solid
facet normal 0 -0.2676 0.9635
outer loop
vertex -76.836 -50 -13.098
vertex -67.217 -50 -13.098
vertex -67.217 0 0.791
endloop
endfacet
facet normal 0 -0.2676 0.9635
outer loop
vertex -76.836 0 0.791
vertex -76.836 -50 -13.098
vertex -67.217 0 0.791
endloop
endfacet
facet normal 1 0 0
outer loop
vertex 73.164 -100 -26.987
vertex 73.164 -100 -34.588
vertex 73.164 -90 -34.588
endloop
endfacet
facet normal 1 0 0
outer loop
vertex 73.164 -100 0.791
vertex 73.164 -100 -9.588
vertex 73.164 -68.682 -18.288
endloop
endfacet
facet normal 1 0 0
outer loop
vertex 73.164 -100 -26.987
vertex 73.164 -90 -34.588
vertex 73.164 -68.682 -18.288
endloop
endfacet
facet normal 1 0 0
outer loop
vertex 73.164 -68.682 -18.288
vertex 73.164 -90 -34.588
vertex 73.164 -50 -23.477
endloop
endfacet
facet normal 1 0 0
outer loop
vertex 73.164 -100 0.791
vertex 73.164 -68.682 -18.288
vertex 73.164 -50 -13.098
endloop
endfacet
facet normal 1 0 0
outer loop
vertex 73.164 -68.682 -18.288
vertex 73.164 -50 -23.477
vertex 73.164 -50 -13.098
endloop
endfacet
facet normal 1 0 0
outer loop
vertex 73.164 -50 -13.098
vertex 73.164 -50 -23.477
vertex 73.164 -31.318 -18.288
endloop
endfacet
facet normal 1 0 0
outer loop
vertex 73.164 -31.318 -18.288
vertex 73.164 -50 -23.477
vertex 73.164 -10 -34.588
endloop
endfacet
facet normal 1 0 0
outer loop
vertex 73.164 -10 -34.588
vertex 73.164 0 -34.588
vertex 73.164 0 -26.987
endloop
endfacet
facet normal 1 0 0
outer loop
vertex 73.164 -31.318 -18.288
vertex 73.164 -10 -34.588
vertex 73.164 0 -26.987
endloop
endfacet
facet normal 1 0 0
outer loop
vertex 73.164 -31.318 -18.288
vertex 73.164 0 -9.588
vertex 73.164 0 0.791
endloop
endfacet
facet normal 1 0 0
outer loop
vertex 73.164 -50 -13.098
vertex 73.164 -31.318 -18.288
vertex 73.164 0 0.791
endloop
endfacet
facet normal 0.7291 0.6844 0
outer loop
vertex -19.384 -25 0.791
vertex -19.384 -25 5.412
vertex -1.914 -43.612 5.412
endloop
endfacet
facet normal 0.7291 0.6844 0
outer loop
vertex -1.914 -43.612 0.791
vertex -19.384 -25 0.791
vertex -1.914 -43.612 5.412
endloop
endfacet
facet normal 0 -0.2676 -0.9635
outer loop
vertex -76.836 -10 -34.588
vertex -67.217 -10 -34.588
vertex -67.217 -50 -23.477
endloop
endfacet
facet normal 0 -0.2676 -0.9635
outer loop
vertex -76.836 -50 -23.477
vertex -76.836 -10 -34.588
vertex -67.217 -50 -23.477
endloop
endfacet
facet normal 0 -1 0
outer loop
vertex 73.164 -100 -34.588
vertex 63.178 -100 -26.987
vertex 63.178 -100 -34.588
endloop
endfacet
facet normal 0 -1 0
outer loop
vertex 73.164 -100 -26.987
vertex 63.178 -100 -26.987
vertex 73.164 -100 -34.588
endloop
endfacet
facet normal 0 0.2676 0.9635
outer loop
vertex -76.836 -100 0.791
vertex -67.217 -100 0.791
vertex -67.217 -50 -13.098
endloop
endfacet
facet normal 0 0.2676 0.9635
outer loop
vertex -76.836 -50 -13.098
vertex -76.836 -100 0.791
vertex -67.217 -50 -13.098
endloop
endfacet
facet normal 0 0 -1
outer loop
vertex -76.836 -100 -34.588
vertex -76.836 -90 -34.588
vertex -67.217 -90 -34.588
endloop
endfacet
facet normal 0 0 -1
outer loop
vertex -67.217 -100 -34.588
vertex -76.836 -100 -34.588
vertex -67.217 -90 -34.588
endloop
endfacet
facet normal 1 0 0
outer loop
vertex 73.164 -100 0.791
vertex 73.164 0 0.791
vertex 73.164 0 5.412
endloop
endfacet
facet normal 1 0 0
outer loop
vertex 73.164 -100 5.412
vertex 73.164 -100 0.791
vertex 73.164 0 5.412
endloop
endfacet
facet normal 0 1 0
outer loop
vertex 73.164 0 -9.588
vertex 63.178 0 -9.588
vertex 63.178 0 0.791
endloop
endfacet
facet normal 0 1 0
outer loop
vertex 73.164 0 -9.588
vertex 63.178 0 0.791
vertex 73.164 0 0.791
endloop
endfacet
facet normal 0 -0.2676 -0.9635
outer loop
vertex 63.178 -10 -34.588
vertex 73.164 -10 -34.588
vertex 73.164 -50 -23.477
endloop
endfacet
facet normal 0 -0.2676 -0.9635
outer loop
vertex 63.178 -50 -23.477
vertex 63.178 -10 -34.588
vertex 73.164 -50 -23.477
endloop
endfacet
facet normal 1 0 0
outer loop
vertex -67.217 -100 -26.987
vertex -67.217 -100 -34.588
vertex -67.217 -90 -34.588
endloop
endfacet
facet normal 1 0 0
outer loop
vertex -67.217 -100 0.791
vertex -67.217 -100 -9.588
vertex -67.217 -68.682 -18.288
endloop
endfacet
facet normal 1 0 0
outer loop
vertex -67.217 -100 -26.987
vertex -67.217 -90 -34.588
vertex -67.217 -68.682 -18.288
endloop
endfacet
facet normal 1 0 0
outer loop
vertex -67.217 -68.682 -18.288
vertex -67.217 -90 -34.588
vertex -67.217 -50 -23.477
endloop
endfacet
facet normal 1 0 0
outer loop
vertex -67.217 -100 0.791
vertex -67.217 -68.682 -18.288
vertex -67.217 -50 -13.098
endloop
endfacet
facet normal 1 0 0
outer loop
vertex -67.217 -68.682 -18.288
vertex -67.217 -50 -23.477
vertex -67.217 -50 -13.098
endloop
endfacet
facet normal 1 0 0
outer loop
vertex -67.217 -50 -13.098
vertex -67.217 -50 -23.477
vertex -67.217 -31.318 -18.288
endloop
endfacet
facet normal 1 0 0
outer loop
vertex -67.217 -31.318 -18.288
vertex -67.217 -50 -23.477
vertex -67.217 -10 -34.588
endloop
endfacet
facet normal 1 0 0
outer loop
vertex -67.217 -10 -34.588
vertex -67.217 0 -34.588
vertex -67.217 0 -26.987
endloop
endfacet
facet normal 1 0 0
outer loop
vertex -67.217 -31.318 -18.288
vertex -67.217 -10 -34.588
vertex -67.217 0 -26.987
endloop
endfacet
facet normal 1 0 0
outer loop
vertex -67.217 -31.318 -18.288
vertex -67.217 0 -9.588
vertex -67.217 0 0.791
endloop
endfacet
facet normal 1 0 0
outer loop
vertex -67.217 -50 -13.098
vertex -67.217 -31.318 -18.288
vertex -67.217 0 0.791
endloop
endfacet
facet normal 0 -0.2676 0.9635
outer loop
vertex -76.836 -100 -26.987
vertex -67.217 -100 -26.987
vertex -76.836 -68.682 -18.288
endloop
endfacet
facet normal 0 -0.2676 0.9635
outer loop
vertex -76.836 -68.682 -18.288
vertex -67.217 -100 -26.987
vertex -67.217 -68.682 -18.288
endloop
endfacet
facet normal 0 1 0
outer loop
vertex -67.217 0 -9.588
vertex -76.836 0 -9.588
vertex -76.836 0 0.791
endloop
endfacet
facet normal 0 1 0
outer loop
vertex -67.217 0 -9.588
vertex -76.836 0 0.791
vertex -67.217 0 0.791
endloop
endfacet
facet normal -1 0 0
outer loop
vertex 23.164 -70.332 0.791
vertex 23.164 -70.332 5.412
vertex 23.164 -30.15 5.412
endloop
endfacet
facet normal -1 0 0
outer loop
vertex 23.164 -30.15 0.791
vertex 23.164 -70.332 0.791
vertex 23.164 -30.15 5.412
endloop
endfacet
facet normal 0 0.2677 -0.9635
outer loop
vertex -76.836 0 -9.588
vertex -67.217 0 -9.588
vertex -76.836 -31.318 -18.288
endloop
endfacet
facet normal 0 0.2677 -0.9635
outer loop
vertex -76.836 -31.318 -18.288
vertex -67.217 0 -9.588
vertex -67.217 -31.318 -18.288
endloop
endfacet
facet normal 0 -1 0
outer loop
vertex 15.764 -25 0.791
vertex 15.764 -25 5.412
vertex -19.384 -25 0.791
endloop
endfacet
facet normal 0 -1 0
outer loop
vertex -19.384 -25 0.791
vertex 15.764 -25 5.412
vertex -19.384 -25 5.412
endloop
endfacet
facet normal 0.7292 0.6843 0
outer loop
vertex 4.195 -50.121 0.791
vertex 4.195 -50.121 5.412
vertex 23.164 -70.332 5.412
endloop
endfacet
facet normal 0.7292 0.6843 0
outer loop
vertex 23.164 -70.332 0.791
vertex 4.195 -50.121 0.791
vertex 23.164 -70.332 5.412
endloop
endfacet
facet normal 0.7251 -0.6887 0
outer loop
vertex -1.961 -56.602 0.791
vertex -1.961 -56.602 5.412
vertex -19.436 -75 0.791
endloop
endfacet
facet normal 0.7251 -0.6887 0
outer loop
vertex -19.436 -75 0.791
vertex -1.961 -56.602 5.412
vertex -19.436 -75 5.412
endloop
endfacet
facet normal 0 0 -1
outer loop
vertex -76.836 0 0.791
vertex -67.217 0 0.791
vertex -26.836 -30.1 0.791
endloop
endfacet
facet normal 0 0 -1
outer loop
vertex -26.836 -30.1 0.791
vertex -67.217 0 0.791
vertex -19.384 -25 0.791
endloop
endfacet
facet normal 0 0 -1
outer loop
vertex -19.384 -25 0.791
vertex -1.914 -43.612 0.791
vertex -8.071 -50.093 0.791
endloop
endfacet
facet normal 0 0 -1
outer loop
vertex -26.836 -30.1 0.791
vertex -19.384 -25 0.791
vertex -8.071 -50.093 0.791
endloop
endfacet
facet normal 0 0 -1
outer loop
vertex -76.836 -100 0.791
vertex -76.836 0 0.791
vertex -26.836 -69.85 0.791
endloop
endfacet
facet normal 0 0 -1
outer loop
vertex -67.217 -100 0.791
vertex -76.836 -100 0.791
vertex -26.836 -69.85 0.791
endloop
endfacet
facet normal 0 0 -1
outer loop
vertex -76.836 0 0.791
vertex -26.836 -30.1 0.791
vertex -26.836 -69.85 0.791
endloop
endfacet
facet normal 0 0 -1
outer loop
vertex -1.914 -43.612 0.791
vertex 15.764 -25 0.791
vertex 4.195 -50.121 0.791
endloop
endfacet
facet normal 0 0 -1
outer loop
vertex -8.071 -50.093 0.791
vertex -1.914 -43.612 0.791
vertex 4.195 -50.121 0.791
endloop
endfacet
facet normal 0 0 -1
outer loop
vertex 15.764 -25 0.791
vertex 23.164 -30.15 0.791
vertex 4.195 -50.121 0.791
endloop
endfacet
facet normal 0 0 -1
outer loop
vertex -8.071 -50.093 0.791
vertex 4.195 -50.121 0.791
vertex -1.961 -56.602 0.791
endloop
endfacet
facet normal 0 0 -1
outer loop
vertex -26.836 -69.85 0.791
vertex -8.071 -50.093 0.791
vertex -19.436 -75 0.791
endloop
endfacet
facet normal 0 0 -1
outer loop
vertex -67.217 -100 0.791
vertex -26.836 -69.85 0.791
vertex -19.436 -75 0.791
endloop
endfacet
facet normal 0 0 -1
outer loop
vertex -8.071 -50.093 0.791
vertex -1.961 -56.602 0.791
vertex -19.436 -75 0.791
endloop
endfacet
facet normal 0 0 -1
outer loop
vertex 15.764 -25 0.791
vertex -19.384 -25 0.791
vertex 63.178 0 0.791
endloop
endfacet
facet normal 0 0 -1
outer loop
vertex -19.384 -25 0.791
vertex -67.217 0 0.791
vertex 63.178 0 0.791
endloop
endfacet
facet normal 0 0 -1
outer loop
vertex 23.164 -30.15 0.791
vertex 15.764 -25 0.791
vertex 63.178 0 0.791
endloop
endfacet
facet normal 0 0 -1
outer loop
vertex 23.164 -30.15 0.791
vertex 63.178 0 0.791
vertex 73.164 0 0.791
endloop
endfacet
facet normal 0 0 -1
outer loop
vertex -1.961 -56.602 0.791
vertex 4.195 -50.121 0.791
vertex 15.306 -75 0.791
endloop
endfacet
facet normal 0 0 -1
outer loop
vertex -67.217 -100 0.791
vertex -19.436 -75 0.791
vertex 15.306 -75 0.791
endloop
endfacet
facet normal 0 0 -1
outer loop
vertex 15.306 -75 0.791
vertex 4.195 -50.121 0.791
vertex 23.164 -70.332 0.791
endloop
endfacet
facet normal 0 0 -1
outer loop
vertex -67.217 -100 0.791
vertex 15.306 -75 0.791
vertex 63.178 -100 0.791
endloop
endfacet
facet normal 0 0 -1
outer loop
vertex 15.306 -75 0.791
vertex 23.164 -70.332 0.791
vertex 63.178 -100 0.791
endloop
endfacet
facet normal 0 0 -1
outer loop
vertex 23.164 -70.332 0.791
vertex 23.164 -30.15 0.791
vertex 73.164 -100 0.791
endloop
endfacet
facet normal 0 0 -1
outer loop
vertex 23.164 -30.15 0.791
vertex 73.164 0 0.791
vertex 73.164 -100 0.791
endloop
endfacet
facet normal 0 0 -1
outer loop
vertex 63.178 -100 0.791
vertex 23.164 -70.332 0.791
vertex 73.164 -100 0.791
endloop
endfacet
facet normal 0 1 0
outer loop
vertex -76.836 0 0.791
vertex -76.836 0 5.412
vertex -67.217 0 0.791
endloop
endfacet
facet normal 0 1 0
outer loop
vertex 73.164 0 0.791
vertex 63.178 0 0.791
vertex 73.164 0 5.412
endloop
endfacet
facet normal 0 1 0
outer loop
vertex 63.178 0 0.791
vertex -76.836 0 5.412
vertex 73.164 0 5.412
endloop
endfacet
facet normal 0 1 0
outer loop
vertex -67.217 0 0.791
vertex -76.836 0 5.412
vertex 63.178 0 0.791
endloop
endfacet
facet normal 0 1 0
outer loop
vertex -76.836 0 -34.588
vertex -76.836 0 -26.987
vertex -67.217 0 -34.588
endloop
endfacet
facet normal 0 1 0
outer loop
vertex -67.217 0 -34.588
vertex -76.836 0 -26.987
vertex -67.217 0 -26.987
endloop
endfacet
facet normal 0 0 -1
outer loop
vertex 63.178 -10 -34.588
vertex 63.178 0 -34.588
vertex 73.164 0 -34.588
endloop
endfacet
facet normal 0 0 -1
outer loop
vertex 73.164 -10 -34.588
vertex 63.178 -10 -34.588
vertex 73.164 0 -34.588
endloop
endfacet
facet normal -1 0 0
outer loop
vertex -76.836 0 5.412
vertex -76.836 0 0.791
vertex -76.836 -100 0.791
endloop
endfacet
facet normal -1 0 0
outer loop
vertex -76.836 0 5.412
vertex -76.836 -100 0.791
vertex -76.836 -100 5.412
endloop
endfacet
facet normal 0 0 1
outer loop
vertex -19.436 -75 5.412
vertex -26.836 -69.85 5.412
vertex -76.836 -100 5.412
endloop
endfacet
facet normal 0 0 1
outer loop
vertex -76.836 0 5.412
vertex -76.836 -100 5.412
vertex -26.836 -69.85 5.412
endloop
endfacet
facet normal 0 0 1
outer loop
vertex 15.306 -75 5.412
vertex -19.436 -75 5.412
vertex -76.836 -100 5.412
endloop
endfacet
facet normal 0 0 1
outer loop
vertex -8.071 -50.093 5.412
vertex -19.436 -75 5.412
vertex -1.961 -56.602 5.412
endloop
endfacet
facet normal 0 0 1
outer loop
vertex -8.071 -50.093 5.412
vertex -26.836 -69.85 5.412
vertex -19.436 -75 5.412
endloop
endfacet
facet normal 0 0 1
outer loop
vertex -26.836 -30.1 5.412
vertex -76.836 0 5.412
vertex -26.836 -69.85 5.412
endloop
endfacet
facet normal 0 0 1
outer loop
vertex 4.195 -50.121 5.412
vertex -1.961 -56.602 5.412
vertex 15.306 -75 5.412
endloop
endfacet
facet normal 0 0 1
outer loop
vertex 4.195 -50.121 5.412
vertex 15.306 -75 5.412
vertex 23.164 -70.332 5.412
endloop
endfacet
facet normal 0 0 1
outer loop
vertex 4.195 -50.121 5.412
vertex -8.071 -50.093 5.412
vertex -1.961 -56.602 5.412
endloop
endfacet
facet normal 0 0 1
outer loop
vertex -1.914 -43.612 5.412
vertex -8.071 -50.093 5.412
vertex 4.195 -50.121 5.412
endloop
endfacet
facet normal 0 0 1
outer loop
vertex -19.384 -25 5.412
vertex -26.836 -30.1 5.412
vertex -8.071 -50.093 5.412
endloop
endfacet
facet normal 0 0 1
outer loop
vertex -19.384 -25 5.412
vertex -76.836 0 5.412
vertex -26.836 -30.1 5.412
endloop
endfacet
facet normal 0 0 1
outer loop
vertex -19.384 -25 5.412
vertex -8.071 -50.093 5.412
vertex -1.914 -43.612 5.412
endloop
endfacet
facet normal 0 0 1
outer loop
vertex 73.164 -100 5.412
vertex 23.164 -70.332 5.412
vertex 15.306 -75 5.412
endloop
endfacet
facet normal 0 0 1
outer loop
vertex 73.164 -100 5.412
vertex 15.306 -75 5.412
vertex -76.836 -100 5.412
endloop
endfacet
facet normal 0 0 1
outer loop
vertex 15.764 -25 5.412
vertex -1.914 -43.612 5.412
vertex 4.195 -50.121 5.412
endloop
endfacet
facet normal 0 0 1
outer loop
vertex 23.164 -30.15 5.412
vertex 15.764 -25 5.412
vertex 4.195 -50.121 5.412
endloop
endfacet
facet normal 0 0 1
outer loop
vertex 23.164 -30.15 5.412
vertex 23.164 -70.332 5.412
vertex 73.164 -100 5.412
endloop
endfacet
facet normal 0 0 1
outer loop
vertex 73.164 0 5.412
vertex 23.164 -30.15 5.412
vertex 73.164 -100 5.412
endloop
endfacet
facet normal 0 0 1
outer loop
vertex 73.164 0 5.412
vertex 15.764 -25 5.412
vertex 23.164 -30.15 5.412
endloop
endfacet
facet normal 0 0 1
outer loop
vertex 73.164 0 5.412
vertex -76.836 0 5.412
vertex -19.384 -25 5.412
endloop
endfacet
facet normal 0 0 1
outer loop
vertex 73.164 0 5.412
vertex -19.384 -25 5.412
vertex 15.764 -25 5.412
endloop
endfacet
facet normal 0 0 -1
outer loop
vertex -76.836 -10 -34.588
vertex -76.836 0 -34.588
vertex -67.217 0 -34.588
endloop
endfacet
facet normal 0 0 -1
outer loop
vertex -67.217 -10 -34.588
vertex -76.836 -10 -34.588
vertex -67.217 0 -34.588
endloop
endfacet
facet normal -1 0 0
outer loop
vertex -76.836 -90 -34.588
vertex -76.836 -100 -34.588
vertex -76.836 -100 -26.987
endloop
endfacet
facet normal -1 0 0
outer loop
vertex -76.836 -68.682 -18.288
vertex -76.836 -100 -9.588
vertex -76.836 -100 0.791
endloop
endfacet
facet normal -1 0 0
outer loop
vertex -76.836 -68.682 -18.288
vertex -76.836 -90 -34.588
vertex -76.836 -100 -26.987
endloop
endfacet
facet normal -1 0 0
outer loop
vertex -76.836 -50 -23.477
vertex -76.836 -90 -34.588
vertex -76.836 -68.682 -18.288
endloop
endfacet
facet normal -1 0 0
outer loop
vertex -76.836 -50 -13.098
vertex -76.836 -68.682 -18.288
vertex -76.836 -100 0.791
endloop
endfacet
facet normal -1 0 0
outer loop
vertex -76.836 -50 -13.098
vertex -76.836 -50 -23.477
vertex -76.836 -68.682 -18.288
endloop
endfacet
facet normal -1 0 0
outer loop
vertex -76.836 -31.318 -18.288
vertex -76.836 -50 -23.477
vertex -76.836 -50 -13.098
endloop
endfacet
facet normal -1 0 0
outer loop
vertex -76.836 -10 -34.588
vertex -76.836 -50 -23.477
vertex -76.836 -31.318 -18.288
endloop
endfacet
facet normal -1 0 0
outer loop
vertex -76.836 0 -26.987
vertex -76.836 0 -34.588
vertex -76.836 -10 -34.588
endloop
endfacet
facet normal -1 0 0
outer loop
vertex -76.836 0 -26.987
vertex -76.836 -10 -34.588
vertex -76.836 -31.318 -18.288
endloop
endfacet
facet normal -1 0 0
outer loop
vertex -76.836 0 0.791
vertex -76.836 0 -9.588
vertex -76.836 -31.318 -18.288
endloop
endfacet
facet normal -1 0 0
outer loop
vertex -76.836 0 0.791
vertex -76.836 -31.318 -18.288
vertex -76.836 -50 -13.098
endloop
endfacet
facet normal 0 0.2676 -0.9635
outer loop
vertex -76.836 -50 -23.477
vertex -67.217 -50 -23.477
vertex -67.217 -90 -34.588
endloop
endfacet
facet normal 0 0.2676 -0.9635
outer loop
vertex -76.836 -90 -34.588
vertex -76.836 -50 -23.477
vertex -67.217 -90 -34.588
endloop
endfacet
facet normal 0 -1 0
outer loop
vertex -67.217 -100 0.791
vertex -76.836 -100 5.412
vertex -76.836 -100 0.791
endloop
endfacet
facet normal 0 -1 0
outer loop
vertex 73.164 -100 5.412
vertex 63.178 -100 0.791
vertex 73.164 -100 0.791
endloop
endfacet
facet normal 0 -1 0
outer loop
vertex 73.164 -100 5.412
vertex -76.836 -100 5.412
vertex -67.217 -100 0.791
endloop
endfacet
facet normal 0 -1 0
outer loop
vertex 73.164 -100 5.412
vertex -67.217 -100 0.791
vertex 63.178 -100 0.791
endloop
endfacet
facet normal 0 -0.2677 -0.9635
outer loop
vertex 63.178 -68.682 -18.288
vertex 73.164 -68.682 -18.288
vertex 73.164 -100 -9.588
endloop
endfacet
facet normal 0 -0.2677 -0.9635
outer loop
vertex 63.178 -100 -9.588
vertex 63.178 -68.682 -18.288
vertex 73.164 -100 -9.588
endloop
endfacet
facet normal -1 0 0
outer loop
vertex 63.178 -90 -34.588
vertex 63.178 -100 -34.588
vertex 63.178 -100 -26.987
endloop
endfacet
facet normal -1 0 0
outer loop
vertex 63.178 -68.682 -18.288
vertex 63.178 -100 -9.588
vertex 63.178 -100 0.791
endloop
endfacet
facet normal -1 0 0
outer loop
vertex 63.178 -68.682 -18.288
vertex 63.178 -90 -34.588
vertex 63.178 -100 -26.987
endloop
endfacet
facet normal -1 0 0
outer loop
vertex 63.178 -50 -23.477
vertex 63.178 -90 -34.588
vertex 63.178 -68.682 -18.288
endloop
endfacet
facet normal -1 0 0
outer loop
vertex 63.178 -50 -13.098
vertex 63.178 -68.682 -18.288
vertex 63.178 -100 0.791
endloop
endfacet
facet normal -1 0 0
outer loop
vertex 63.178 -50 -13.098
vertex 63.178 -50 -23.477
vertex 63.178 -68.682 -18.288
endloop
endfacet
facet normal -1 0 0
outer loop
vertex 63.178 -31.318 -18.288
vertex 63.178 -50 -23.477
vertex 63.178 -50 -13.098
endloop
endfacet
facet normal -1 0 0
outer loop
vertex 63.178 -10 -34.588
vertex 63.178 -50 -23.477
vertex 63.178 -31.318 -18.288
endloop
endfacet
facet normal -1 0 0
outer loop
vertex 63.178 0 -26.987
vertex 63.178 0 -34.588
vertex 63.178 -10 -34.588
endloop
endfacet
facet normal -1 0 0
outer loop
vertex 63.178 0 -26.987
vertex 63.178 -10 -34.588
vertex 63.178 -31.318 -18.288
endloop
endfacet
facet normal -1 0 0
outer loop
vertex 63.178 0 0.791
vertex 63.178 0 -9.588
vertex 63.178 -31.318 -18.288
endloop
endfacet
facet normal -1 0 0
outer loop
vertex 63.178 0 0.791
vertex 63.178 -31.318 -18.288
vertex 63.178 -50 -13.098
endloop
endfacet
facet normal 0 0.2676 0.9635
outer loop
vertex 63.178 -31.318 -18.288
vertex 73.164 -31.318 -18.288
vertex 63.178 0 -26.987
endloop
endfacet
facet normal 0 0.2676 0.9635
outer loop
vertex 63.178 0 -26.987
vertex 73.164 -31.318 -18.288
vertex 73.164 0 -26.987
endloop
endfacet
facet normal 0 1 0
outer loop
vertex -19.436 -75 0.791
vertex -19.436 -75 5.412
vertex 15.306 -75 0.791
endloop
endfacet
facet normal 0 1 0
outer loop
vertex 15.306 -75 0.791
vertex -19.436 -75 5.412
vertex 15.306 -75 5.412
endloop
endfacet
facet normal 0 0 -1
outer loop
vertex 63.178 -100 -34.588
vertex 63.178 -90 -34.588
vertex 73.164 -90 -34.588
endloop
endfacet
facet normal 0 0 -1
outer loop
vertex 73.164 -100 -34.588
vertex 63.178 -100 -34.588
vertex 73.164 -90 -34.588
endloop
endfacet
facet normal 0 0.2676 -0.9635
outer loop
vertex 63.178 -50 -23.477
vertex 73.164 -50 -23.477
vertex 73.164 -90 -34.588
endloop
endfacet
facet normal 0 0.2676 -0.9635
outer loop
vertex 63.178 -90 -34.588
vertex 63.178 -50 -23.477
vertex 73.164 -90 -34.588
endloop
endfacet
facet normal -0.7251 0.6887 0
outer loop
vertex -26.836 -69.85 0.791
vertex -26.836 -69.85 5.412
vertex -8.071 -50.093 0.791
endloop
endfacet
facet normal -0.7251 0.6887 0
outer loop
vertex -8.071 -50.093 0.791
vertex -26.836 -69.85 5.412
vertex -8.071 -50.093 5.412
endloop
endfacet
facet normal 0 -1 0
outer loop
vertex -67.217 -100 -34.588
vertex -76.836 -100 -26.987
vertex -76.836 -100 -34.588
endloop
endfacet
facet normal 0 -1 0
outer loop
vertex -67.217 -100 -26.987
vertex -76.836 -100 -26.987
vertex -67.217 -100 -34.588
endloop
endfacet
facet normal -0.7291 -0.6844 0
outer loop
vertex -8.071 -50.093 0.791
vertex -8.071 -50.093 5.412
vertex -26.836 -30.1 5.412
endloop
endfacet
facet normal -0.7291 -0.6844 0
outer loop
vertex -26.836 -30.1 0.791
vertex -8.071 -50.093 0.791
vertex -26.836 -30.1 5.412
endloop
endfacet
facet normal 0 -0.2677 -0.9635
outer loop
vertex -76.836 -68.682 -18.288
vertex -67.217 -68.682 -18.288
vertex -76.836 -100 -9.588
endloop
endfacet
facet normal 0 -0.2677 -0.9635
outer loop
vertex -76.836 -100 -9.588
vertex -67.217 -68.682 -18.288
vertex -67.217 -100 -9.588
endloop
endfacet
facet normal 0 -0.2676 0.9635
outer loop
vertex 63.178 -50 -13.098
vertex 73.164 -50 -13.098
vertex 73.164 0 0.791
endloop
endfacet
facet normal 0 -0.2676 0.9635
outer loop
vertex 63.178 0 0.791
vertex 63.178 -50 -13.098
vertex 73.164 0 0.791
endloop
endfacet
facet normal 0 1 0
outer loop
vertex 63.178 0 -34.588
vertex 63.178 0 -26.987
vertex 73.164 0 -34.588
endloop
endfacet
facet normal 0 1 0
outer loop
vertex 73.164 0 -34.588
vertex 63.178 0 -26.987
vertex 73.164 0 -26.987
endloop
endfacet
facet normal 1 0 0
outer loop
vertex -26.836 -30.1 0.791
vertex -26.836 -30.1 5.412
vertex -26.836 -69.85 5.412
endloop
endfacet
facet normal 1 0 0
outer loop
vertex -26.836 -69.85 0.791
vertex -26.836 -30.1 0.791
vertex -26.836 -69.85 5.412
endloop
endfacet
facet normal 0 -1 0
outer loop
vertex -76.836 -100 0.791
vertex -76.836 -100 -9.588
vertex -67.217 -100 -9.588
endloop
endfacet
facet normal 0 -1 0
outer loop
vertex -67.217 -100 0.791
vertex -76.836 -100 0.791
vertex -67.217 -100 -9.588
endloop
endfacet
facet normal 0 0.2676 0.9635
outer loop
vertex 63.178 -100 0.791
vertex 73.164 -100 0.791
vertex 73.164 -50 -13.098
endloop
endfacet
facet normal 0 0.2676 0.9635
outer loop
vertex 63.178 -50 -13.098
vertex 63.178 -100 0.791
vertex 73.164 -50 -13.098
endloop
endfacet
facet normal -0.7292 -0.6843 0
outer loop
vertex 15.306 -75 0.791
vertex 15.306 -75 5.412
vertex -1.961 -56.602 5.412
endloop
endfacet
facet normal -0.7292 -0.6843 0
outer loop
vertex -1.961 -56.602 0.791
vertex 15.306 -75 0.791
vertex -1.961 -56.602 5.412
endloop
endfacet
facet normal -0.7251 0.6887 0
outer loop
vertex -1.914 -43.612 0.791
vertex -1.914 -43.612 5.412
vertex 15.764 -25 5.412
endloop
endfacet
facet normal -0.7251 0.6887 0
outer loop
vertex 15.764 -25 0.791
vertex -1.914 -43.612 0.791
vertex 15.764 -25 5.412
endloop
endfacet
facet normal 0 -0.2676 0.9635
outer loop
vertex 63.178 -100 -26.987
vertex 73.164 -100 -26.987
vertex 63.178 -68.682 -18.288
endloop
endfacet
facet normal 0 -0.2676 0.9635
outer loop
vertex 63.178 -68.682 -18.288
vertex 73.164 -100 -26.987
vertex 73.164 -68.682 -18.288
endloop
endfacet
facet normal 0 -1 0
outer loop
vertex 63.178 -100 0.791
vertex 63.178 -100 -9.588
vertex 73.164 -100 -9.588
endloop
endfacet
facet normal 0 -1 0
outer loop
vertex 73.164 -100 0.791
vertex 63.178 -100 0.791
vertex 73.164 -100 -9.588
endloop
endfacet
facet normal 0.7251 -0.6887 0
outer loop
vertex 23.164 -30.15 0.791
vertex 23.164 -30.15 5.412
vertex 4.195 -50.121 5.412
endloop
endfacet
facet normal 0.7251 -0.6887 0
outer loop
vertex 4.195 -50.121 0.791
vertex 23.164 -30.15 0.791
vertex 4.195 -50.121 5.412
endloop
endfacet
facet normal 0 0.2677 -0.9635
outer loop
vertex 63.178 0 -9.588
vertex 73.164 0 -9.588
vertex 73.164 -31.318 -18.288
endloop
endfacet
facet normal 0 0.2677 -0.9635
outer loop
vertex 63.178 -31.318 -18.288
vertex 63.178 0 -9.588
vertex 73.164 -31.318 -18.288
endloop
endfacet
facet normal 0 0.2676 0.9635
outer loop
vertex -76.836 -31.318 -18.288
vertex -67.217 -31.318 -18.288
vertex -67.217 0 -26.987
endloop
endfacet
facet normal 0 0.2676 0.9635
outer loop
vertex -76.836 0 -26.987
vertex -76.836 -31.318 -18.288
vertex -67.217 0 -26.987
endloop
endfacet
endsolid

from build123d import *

# Parameters (mm, degrees)
F0_W     = 1500
F0_H     = 400
F1_DEPTH = 1000
F3_DEPTH = 1500.001
F5_W     = 1303.9535284042
F5_H     = 357.2461120359
F6_DEPTH = 1000.001
F8_DEPTH = 400.001
F9_SCALE = 0.1


with BuildPart() as f1:
    # F0 (on Front) → F1 (new body)
    with BuildSketch(Plane.XZ):
        with Locations((-18.3606576174, -145.8811463788)):
            Rectangle(F0_W, F0_H)
    extrude(amount=F1_DEPTH)

    # F2 (on face) → F3 (cut, through all)
    with BuildSketch(Plane.YZ.offset(731.6393423826)):
        Polygon((-1000, 7.905196356), (-500, -130.9836925329), (0, 7.905196356), align=None)
        Polygon((-500, -234.7700352677), (-900, -345.8811463788), (-100, -345.8811463788), align=None)
        Polygon((0, -95.8811463788), (-313.1845830773, -182.8768639003), (0, -269.8725814218), align=None)
        Polygon((-1000, -269.8725814218), (-686.8154169227, -182.8768639003), (-1000, -95.8811463788), align=None)
    extrude(amount=-F3_DEPTH, mode=Mode.SUBTRACT)

    # F5 (on face) → F6 (cut, through all)
    with BuildSketch(Plane(origin=(0, 0, 0), x_dir=(-1, 0, 0), z_dir=(0, 1, 0))):
        with Locations((20.1920866966, -170.717859662)):
            Rectangle(F5_W, F5_H)
    extrude(amount=-F6_DEPTH, mode=Mode.SUBTRACT)

    # F7 (on face) → F8 (cut, through all)
    with BuildSketch(Plane.XY.offset(54.1188536212)):
        Polygon((231.6393423826, -703.3171292919), (231.6393423826, -301.4968633652), (41.9458825629, -501.2107406615), align=None)
        Polygon((153.0627522819, -750), (-19.6146414143, -566.0231540339), (-194.3606576174, -750), align=None)
        Polygon((-268.3606576174, -698.5031366348), (-80.7052512791, -500.9349714958), (-268.3606576174, -301), align=None)
        Polygon((-19.144727302, -436.1225581235), (157.6393423826, -250), (-193.8360482454, -250), align=None)
    extrude(amount=-F8_DEPTH, mode=Mode.SUBTRACT)


with BuildPart() as f1_1:
    # F9: moved
    add(f1.part.scale(F9_SCALE))


solid = f1_1.part
